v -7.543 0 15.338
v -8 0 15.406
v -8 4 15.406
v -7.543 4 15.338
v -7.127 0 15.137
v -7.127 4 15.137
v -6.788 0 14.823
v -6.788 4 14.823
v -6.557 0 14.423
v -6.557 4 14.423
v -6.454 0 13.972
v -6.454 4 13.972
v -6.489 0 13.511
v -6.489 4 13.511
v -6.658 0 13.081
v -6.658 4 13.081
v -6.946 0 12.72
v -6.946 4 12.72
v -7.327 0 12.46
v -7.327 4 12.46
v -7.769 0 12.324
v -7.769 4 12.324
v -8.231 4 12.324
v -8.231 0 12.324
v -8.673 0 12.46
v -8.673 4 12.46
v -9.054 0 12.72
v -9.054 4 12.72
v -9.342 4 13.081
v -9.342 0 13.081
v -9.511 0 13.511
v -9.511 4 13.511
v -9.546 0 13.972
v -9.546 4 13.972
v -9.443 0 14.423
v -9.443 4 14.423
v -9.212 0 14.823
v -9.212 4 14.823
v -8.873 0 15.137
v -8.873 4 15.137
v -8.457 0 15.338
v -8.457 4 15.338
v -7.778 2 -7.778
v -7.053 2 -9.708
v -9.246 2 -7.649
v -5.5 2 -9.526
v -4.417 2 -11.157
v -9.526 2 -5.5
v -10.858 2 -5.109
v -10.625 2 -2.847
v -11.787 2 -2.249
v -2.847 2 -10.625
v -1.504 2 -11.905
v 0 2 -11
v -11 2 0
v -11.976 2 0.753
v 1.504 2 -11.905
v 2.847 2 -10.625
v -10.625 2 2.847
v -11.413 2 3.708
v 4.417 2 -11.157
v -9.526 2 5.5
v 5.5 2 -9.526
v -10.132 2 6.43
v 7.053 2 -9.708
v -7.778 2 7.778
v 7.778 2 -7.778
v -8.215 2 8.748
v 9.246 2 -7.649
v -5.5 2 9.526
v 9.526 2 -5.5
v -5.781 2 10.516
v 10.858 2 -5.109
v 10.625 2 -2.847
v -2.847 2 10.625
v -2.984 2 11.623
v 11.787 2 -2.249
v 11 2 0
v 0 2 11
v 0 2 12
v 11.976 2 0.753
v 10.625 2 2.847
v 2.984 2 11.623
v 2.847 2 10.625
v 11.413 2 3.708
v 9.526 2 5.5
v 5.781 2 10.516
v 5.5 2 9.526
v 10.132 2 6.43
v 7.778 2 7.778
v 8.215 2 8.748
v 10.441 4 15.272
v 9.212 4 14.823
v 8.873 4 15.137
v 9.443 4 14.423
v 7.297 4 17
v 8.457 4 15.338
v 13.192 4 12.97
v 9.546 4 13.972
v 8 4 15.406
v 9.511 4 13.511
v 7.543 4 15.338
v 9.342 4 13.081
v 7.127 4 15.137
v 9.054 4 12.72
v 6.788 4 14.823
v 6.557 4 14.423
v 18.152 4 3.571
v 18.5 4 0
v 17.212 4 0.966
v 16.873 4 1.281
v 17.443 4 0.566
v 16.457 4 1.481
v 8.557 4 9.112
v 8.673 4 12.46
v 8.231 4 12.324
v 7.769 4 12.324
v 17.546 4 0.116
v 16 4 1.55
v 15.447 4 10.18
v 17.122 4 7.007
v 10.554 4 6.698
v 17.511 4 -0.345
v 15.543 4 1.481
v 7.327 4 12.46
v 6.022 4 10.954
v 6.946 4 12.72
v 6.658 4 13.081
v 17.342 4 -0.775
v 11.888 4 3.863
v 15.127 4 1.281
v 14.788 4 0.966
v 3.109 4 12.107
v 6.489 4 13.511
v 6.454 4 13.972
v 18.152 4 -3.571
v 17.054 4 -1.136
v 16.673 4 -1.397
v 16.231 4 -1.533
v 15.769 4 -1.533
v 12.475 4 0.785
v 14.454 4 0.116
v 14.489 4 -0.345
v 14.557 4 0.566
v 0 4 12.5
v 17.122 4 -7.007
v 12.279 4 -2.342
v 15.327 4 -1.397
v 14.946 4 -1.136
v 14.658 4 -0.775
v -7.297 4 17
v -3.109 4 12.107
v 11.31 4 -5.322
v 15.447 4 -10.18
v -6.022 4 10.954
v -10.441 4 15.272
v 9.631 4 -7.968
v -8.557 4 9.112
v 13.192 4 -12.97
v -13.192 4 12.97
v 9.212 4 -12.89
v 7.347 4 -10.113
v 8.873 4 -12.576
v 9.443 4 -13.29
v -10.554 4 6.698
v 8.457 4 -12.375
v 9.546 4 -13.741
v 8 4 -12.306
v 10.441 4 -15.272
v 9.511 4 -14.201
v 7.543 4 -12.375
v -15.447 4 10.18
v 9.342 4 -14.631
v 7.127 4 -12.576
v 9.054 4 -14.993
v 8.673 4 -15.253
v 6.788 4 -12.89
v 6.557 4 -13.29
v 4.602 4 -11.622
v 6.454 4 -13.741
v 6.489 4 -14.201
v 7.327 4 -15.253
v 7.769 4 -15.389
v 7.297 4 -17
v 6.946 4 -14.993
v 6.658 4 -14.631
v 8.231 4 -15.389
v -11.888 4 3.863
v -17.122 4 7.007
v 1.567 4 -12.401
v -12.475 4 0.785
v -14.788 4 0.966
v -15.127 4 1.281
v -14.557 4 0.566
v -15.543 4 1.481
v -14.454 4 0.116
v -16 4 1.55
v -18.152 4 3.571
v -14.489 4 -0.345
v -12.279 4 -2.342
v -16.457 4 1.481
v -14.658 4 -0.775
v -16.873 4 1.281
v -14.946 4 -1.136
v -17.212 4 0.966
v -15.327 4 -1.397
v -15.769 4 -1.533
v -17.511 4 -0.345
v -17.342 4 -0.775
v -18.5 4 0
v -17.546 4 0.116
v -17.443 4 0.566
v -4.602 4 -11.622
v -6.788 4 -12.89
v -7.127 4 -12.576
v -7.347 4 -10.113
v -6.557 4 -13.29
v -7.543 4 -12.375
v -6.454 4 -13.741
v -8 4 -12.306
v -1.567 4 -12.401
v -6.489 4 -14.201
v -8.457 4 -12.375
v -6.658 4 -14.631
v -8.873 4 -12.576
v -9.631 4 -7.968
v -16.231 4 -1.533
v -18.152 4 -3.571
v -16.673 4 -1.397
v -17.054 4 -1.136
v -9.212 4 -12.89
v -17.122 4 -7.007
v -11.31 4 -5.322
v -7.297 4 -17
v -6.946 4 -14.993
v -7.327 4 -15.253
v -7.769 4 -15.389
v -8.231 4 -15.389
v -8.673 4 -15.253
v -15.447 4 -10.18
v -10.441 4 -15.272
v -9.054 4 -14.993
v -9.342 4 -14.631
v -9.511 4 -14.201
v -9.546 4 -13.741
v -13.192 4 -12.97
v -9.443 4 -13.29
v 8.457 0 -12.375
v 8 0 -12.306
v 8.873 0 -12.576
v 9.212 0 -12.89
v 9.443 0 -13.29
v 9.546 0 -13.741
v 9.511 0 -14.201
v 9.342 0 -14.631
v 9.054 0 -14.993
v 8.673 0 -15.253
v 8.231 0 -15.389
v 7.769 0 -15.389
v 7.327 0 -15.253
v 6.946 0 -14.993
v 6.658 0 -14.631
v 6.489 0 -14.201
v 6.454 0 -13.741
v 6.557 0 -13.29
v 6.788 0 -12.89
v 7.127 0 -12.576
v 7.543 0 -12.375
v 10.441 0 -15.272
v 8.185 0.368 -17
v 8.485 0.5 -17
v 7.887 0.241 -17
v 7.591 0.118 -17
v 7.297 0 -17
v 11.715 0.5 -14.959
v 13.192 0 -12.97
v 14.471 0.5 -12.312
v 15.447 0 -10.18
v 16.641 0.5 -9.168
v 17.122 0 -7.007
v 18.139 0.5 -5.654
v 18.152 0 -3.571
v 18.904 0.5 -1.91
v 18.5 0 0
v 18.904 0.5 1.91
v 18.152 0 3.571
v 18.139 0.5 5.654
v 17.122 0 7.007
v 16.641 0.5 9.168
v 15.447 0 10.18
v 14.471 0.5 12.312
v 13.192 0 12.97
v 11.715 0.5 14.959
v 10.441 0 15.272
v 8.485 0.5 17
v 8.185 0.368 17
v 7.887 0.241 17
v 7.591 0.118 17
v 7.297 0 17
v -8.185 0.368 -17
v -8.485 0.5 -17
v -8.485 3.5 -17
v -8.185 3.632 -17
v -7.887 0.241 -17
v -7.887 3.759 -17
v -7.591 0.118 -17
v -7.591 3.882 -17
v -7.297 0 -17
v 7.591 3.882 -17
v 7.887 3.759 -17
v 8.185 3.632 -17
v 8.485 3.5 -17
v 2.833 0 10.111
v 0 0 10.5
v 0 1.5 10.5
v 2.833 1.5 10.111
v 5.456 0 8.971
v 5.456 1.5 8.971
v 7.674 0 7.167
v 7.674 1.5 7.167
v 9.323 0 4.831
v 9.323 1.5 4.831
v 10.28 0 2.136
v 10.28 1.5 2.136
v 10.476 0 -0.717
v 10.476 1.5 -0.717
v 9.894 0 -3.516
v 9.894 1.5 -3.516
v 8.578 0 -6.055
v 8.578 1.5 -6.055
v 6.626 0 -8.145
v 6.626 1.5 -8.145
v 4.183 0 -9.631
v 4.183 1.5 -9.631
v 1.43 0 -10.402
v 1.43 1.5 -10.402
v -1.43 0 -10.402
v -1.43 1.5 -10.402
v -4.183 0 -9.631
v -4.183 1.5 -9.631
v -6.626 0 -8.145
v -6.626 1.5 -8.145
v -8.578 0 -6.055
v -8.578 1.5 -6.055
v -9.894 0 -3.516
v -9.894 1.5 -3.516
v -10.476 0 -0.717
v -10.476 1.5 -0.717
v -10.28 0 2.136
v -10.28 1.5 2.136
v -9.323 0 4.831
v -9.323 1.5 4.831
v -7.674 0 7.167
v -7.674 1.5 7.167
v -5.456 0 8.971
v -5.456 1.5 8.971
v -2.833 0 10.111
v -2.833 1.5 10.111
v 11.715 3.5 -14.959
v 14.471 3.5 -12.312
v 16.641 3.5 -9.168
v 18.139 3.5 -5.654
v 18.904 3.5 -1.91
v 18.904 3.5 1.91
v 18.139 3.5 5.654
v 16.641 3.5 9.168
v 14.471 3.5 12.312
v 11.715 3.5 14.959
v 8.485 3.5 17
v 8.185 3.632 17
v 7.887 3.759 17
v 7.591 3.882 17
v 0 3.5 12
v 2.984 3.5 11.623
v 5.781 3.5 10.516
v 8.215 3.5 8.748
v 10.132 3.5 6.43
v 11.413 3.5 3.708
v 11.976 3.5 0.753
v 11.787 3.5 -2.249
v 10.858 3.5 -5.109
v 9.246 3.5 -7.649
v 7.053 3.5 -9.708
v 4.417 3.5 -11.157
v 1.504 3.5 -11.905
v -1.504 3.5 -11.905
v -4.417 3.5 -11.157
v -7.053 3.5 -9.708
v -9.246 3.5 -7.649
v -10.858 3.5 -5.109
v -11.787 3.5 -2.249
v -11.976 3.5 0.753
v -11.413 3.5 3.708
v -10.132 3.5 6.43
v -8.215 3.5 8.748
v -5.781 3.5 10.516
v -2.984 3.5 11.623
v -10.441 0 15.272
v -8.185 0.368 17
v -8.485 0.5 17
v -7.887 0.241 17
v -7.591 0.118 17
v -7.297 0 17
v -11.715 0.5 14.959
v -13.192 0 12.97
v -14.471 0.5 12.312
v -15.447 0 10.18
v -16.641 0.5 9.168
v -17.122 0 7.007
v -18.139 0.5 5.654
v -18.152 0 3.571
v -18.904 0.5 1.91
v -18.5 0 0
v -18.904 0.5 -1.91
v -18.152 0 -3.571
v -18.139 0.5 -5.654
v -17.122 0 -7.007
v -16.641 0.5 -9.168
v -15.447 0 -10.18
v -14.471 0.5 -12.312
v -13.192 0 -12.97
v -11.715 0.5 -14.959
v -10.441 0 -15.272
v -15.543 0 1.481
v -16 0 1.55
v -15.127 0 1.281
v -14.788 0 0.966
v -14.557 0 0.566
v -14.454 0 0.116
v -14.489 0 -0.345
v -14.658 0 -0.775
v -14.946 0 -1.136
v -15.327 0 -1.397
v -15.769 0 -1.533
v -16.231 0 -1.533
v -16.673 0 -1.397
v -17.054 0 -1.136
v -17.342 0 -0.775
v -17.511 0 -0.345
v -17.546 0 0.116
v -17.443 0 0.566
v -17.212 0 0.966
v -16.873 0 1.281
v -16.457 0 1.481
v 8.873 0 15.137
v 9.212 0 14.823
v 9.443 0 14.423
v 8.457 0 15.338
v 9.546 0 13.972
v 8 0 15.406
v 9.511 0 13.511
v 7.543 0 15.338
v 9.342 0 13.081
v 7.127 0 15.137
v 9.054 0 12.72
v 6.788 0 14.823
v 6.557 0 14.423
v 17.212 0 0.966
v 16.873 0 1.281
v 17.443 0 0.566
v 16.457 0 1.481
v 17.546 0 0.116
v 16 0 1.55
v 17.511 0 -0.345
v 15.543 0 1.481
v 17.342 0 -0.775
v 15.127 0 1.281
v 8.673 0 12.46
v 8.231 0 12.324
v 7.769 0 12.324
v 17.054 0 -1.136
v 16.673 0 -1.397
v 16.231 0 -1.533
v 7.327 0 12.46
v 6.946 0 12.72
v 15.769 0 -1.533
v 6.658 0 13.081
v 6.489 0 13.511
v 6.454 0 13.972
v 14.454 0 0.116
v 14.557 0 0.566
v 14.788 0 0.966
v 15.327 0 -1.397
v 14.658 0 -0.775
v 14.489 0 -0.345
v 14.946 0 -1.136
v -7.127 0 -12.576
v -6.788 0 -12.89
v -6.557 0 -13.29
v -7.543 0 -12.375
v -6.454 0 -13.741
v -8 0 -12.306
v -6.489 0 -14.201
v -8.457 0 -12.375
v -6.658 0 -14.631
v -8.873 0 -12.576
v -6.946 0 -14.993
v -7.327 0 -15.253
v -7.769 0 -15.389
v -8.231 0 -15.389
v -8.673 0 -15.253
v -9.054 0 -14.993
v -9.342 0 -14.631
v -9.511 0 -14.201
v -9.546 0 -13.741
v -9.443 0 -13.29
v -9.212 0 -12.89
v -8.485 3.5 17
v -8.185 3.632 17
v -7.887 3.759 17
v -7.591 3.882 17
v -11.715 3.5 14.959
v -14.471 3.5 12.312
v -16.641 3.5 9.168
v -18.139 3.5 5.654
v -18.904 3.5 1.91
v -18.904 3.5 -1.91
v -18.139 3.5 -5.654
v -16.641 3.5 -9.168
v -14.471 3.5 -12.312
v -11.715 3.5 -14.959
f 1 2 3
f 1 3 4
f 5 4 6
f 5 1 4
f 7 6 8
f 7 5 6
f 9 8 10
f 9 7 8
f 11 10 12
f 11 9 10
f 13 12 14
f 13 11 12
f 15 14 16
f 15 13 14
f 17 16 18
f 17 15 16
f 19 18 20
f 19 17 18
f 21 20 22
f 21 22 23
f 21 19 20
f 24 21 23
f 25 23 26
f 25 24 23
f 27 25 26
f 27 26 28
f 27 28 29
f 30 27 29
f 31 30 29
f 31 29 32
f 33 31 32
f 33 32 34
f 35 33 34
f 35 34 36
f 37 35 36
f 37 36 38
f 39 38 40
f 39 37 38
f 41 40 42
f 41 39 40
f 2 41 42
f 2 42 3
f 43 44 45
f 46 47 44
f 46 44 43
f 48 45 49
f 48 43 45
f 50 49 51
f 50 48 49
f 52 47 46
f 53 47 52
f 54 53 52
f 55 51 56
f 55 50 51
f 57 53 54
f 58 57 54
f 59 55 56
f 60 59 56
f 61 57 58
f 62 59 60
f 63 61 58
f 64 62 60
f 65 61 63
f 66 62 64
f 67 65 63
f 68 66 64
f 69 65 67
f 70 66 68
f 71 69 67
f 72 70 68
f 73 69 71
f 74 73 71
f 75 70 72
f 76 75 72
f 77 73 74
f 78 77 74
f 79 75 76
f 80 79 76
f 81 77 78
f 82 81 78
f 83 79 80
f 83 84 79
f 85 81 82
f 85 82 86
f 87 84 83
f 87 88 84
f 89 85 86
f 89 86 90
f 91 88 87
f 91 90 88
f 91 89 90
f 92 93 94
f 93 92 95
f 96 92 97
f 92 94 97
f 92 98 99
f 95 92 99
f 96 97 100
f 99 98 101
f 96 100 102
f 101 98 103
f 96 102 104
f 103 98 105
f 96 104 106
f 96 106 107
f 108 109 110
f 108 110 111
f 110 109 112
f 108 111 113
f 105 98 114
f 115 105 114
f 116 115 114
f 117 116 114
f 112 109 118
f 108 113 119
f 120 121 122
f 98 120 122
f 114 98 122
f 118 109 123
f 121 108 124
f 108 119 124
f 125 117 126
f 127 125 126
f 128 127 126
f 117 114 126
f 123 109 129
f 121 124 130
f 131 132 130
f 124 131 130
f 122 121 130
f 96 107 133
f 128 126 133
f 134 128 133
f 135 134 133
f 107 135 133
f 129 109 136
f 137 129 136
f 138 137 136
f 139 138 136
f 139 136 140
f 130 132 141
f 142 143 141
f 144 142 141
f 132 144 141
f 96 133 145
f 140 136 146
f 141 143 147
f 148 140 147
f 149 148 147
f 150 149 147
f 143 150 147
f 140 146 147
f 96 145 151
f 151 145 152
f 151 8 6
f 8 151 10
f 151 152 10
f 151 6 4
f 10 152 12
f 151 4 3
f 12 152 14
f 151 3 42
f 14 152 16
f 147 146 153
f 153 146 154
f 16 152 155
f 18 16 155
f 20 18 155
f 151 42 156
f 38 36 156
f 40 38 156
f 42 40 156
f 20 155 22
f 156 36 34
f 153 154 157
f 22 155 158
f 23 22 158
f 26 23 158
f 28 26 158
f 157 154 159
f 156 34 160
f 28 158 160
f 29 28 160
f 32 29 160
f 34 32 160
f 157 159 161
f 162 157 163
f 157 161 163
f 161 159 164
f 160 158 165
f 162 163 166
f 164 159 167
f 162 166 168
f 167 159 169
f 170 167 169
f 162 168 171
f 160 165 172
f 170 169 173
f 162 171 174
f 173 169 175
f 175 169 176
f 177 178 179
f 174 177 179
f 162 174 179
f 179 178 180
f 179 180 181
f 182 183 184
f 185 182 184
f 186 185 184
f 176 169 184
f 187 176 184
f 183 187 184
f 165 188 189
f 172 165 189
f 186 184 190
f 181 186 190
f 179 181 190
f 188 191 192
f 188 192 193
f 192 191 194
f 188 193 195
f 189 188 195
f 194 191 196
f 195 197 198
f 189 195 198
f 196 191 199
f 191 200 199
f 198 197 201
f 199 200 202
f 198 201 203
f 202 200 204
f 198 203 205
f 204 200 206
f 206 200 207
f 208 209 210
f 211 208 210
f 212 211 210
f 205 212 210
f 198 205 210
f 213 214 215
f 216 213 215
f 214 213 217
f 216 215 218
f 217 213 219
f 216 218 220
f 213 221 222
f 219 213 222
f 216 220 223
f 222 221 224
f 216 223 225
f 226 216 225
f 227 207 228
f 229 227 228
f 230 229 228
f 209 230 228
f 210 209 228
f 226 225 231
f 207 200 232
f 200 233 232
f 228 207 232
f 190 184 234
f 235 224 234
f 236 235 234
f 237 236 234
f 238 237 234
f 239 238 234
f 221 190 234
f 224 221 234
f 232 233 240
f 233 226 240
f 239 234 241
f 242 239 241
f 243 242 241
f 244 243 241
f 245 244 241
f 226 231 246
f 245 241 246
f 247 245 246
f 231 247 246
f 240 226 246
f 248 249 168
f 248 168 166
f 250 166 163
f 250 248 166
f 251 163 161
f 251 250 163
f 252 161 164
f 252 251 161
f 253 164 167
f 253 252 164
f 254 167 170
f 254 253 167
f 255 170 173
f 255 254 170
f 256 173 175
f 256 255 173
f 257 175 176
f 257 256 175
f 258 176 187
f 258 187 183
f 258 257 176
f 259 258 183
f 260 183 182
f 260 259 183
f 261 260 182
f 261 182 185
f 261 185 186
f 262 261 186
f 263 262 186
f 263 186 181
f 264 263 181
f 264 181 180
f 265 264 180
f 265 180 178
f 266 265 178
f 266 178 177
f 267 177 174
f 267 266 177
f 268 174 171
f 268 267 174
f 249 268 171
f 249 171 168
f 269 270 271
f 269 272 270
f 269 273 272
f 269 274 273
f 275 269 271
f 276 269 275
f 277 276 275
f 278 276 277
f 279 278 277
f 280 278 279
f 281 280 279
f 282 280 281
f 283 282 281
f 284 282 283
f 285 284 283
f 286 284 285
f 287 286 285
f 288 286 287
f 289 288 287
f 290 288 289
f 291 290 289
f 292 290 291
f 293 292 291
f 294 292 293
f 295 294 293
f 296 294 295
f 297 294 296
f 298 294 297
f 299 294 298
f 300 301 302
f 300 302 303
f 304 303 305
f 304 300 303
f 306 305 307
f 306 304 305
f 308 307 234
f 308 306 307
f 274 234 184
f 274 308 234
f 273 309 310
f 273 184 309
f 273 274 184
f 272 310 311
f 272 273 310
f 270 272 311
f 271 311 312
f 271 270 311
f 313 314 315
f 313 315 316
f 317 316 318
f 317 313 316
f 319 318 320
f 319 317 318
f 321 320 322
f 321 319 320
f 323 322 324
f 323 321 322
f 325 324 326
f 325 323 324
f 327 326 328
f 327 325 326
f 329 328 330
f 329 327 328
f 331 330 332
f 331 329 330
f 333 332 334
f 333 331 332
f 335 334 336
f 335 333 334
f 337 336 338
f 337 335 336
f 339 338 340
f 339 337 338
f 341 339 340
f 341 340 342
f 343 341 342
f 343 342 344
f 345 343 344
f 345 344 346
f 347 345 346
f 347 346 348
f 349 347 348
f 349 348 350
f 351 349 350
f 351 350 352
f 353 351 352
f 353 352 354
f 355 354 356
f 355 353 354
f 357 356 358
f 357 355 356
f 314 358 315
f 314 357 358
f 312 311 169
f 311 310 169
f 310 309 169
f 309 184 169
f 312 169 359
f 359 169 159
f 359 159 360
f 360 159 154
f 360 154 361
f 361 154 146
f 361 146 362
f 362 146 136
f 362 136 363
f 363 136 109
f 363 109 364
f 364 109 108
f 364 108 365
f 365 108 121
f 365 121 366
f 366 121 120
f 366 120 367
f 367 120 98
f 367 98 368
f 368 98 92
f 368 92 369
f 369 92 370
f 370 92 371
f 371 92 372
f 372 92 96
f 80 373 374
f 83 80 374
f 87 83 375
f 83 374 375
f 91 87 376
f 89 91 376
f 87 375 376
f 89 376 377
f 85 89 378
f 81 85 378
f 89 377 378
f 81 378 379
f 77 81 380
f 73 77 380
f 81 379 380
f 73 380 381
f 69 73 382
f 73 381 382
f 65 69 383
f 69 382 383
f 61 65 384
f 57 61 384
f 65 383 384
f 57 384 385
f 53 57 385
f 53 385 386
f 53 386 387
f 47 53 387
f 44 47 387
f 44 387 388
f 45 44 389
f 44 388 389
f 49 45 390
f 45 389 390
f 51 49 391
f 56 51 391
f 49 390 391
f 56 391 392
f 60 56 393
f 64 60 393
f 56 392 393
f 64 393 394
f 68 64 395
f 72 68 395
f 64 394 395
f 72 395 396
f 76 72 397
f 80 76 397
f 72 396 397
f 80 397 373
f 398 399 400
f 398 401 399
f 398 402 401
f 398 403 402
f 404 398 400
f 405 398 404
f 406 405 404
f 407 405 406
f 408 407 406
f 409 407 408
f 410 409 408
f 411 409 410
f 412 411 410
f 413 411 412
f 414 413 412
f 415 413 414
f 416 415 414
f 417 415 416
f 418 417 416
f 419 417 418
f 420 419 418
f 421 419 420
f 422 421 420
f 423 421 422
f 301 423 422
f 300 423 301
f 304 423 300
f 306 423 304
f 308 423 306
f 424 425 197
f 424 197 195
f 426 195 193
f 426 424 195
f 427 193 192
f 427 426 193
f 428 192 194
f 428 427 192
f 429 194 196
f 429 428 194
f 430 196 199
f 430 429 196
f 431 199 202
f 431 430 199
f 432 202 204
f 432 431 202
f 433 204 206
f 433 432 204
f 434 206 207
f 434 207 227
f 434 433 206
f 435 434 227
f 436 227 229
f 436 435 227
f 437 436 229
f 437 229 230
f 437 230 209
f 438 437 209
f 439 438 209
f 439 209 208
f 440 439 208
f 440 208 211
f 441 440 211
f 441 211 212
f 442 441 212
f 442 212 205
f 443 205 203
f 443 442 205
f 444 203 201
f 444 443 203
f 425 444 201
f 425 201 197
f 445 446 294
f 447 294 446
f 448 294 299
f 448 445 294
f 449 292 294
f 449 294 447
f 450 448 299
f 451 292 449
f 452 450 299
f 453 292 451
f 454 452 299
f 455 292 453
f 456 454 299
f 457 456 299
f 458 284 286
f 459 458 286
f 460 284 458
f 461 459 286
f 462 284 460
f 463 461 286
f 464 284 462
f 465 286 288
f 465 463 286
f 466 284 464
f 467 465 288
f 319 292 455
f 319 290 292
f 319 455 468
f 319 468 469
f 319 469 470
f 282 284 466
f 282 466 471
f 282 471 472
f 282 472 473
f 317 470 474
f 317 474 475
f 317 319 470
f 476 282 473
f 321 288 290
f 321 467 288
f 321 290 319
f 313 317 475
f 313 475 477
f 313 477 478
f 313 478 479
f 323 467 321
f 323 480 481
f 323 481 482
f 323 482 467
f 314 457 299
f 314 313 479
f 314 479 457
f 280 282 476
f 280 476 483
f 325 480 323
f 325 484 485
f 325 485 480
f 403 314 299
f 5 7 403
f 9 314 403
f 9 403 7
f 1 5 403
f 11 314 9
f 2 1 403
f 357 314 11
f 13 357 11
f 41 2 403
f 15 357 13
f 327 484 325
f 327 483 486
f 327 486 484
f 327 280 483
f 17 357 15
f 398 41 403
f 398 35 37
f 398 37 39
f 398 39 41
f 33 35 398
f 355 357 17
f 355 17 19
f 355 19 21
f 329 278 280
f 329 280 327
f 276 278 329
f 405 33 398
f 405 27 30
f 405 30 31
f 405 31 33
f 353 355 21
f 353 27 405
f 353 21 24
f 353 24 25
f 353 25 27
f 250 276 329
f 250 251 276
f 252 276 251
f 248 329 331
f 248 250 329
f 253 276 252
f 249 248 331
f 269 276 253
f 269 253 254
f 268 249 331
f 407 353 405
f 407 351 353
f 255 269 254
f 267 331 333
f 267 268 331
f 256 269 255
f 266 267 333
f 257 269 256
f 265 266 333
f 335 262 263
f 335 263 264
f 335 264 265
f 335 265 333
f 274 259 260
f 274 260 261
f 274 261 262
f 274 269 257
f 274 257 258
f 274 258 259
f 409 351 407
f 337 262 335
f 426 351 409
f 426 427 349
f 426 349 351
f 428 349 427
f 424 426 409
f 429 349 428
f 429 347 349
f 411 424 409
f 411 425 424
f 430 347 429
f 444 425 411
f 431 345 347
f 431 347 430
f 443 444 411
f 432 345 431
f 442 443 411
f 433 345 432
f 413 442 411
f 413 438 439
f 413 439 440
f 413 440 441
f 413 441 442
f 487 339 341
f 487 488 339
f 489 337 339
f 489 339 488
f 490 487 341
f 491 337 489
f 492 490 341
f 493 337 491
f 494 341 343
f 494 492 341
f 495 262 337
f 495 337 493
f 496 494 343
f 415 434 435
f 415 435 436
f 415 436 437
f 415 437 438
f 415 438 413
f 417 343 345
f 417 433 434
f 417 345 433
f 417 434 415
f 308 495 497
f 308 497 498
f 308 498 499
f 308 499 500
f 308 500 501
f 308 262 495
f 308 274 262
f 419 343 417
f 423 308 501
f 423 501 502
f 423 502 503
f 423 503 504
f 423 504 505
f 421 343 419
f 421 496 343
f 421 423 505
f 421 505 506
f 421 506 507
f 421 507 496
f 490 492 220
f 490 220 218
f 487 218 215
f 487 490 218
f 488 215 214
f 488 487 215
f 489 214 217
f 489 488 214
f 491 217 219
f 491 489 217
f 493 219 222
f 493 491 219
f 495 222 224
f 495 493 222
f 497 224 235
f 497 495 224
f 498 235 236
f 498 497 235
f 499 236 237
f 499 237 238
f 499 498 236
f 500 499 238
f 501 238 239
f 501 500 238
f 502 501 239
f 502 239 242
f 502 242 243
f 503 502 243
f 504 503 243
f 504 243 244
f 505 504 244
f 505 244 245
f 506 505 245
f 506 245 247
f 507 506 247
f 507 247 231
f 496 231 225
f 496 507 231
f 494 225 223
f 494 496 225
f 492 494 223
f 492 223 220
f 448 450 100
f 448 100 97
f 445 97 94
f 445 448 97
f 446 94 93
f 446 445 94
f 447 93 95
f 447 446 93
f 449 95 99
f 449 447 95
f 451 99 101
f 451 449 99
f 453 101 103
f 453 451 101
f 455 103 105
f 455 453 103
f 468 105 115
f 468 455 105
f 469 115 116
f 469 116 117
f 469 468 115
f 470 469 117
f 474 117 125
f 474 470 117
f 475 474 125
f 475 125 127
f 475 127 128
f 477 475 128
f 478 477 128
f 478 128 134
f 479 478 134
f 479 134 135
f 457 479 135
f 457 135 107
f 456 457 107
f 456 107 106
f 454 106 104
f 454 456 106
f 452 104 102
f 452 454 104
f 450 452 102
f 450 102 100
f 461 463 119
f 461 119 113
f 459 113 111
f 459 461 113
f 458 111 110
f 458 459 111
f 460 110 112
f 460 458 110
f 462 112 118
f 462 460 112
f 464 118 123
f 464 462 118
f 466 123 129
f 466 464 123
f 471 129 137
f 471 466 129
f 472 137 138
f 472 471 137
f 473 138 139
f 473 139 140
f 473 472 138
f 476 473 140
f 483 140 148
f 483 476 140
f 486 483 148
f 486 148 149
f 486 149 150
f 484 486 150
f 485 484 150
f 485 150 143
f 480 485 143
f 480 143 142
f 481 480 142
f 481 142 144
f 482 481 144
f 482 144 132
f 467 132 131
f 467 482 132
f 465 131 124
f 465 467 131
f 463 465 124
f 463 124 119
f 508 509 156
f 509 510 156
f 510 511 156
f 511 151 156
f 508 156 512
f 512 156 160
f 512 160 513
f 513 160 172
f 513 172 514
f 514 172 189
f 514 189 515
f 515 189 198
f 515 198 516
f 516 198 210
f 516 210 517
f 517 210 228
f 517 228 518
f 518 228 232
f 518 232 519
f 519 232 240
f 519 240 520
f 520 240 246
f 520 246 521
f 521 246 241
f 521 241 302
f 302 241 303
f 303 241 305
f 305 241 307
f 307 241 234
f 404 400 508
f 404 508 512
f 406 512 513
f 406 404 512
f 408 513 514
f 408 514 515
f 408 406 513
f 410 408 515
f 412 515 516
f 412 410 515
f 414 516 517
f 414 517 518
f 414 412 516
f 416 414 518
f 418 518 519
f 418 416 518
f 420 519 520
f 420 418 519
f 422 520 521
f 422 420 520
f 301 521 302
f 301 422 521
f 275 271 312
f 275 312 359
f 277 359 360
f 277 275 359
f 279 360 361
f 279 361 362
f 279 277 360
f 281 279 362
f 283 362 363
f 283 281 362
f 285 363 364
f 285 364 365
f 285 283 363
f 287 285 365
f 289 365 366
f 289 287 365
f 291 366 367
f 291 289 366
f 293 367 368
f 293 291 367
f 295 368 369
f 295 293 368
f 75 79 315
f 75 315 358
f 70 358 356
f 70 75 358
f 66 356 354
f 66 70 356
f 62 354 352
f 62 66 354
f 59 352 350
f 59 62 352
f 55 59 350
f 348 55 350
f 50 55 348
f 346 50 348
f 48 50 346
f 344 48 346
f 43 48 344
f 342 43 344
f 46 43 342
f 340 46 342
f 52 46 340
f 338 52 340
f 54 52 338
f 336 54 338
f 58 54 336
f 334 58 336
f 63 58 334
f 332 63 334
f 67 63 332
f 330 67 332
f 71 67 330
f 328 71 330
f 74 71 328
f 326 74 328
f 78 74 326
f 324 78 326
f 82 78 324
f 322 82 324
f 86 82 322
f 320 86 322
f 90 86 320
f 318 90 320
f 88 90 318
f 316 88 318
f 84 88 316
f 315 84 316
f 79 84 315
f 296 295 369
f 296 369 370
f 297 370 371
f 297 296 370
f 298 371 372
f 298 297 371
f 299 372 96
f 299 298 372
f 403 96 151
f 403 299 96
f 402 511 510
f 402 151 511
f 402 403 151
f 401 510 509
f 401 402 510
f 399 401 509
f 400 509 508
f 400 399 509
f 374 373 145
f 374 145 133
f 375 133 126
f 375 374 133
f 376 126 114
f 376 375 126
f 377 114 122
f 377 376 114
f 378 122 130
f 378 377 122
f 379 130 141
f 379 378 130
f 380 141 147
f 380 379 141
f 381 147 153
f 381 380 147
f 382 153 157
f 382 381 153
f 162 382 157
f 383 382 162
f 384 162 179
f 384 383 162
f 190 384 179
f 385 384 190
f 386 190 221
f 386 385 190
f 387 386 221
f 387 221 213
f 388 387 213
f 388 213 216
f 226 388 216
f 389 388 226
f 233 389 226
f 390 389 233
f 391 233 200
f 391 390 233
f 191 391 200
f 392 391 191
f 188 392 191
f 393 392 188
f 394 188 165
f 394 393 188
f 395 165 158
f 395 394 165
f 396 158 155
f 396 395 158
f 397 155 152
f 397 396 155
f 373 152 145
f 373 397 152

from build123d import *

# Parameters (mm, degrees)
SKETCH1_R           = 10.5
SKETCH1_R_2         = 1.55
BOSS_EXTRUDE1_DEPTH = 4
SKETCH2_R           = 12
CUT_EXTRUDE1_DEPTH  = 2
CHAMFER1_SIZE       = 0.5


with BuildPart() as part:
    # Sketch1 → Boss-Extrude1 (new body)
    with BuildSketch(Plane(origin=(0, 0, 0), x_dir=(1, 0, 0), z_dir=(0, 1, 0))):
        with BuildLine():
            Line((-8.485281374, 17), (8.485281374, 17))
            ThreePointArc((8.485281374, 17), (19, 0), (8.485281374, -17))
            Line((8.485281374, -17), (-8.485281374, -17))
            ThreePointArc((-8.485281374, -17), (-19, 0), (-8.485281374, 17))
        make_face()
        with Locations(Location((0, 0, 0), (0, 0, 270))):
            Circle(SKETCH1_R, mode=Mode.SUBTRACT)
        with Locations(Location((-16, 0, 0), (0, 0, 270))):
            Circle(SKETCH1_R_2, mode=Mode.SUBTRACT)
        with Locations(Location((-8, 13.856406461, 0), (0, 0, 270))):
            Circle(SKETCH1_R_2, mode=Mode.SUBTRACT)
        with Locations(Location((8, 13.856406461, 0), (0, 0, 270))):
            Circle(SKETCH1_R_2, mode=Mode.SUBTRACT)
        with Locations(Location((16, 0, 0), (0, 0, 270))):
            Circle(SKETCH1_R_2, mode=Mode.SUBTRACT)
        with Locations(Location((8, -13.856406461, 0), (0, 0, 270))):
            Circle(SKETCH1_R_2, mode=Mode.SUBTRACT)
        with Locations(Location((-8, -13.856406461, 0), (0, 0, 270))):
            Circle(SKETCH1_R_2, mode=Mode.SUBTRACT)
    extrude(amount=BOSS_EXTRUDE1_DEPTH)

    # Sketch2 → Cut-Extrude1 (cut)
    with BuildSketch(Plane(origin=(0, 4, 0), x_dir=(1, 0, 0), z_dir=(0, 1, 0))):
        with Locations(Location((0, 0, 0), (0, 0, 270))):
            Circle(SKETCH2_R)
    extrude(amount=-CUT_EXTRUDE1_DEPTH, mode=Mode.SUBTRACT)

    # Chamfer1
    chamfer1_edges = [part.edges().sort_by_distance(p)[0] for p in [
        (-19, 4, 0),
        (0, 2, -10.5),
        (0, 4, -12),
        (19, 4, 0),
        (-19, 0, 0),
        (19, 0, 0),
    ]]
    chamfer(chamfer1_edges, length=CHAMFER1_SIZE)


solid = part.part
